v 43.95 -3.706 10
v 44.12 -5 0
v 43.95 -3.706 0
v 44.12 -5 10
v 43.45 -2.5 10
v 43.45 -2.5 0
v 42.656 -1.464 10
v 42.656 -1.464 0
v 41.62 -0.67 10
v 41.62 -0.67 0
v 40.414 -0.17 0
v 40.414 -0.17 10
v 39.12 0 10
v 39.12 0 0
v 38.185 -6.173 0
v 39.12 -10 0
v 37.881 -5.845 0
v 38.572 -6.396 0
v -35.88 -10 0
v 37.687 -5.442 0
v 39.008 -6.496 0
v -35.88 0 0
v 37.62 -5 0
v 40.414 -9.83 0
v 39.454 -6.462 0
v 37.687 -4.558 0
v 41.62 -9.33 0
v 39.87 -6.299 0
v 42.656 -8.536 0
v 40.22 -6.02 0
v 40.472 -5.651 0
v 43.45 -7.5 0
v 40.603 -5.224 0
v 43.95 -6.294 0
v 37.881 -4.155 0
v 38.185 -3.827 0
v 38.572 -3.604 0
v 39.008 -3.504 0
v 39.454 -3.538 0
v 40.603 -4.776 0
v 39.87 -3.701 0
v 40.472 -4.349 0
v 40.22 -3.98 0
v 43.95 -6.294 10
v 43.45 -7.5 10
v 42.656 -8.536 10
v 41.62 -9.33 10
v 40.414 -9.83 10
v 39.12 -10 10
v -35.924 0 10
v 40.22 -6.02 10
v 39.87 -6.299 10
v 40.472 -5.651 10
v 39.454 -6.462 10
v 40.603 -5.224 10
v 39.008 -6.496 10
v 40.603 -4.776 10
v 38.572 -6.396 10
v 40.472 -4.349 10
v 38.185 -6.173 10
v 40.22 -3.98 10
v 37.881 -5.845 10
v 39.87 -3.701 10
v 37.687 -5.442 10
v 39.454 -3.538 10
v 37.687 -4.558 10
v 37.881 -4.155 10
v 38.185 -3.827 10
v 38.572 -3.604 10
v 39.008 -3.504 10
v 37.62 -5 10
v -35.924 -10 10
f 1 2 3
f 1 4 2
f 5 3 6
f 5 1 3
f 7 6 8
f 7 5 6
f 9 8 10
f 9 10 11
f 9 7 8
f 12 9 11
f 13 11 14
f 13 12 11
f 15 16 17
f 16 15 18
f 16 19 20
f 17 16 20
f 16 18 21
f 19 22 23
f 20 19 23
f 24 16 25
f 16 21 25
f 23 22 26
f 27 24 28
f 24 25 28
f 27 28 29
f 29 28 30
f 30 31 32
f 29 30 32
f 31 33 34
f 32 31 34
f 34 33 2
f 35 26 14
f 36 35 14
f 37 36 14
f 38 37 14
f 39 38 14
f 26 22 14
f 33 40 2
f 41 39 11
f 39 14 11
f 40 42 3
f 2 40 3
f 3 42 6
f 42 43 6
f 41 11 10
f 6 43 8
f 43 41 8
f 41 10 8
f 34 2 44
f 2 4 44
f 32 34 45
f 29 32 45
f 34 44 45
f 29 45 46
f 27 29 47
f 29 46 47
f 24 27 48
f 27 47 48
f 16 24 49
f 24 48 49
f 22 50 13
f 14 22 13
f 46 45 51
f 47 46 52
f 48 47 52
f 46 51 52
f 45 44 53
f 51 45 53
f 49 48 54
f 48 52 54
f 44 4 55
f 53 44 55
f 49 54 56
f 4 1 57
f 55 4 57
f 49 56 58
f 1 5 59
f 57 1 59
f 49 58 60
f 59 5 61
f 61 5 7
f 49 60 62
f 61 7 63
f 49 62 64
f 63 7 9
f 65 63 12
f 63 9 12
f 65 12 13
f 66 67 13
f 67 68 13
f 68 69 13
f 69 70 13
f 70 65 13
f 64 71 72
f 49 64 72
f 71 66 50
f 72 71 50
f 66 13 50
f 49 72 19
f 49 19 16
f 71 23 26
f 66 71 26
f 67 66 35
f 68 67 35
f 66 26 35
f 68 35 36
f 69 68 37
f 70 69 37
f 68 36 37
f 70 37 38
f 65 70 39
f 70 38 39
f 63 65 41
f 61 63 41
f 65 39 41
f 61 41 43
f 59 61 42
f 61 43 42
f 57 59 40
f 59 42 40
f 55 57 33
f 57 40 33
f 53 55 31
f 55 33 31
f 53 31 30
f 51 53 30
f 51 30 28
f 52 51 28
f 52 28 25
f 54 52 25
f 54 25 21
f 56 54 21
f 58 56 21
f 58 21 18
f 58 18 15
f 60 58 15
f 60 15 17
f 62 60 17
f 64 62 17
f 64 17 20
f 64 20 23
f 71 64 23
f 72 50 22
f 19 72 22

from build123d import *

# Parameters (mm, degrees)
F1_DEPTH = 10
F3_D     = 3
F4_R     = 4.99999


# Not quite as in the source:
# - a fillet or chamfer is up to 0.001 mm smaller than in the source, because OpenCascade refuses the exact size


with BuildPart() as f1:
    # F0 (on Front) → F1 (new body)
    with BuildSketch(Plane.XZ):
        Polygon((-25.8799286838, 0), (44.1200713162, 0), (44.1200713162, 10), (-25.9238125384, 10), (-35.9238125384, 10), (-35.8799286838, 0), align=None)
    extrude(amount=F1_DEPTH)

    # F3 (through all)
    with Locations(Plane.XY.offset(10)):
        with Locations((39.1200713162, -5)):
            Hole(F3_D / 2)

    # F4 (radius 5 in the source; OpenCascade refuses exactly that, so slightly less here)
    f4_edges = [f1.edges().sort_by_distance(p)[0] for p in [
        (44.120071, -10, 5),
        (44.120071, 0, 5),
    ]]
    fillet(f4_edges, radius=F4_R)


solid = f1.part
